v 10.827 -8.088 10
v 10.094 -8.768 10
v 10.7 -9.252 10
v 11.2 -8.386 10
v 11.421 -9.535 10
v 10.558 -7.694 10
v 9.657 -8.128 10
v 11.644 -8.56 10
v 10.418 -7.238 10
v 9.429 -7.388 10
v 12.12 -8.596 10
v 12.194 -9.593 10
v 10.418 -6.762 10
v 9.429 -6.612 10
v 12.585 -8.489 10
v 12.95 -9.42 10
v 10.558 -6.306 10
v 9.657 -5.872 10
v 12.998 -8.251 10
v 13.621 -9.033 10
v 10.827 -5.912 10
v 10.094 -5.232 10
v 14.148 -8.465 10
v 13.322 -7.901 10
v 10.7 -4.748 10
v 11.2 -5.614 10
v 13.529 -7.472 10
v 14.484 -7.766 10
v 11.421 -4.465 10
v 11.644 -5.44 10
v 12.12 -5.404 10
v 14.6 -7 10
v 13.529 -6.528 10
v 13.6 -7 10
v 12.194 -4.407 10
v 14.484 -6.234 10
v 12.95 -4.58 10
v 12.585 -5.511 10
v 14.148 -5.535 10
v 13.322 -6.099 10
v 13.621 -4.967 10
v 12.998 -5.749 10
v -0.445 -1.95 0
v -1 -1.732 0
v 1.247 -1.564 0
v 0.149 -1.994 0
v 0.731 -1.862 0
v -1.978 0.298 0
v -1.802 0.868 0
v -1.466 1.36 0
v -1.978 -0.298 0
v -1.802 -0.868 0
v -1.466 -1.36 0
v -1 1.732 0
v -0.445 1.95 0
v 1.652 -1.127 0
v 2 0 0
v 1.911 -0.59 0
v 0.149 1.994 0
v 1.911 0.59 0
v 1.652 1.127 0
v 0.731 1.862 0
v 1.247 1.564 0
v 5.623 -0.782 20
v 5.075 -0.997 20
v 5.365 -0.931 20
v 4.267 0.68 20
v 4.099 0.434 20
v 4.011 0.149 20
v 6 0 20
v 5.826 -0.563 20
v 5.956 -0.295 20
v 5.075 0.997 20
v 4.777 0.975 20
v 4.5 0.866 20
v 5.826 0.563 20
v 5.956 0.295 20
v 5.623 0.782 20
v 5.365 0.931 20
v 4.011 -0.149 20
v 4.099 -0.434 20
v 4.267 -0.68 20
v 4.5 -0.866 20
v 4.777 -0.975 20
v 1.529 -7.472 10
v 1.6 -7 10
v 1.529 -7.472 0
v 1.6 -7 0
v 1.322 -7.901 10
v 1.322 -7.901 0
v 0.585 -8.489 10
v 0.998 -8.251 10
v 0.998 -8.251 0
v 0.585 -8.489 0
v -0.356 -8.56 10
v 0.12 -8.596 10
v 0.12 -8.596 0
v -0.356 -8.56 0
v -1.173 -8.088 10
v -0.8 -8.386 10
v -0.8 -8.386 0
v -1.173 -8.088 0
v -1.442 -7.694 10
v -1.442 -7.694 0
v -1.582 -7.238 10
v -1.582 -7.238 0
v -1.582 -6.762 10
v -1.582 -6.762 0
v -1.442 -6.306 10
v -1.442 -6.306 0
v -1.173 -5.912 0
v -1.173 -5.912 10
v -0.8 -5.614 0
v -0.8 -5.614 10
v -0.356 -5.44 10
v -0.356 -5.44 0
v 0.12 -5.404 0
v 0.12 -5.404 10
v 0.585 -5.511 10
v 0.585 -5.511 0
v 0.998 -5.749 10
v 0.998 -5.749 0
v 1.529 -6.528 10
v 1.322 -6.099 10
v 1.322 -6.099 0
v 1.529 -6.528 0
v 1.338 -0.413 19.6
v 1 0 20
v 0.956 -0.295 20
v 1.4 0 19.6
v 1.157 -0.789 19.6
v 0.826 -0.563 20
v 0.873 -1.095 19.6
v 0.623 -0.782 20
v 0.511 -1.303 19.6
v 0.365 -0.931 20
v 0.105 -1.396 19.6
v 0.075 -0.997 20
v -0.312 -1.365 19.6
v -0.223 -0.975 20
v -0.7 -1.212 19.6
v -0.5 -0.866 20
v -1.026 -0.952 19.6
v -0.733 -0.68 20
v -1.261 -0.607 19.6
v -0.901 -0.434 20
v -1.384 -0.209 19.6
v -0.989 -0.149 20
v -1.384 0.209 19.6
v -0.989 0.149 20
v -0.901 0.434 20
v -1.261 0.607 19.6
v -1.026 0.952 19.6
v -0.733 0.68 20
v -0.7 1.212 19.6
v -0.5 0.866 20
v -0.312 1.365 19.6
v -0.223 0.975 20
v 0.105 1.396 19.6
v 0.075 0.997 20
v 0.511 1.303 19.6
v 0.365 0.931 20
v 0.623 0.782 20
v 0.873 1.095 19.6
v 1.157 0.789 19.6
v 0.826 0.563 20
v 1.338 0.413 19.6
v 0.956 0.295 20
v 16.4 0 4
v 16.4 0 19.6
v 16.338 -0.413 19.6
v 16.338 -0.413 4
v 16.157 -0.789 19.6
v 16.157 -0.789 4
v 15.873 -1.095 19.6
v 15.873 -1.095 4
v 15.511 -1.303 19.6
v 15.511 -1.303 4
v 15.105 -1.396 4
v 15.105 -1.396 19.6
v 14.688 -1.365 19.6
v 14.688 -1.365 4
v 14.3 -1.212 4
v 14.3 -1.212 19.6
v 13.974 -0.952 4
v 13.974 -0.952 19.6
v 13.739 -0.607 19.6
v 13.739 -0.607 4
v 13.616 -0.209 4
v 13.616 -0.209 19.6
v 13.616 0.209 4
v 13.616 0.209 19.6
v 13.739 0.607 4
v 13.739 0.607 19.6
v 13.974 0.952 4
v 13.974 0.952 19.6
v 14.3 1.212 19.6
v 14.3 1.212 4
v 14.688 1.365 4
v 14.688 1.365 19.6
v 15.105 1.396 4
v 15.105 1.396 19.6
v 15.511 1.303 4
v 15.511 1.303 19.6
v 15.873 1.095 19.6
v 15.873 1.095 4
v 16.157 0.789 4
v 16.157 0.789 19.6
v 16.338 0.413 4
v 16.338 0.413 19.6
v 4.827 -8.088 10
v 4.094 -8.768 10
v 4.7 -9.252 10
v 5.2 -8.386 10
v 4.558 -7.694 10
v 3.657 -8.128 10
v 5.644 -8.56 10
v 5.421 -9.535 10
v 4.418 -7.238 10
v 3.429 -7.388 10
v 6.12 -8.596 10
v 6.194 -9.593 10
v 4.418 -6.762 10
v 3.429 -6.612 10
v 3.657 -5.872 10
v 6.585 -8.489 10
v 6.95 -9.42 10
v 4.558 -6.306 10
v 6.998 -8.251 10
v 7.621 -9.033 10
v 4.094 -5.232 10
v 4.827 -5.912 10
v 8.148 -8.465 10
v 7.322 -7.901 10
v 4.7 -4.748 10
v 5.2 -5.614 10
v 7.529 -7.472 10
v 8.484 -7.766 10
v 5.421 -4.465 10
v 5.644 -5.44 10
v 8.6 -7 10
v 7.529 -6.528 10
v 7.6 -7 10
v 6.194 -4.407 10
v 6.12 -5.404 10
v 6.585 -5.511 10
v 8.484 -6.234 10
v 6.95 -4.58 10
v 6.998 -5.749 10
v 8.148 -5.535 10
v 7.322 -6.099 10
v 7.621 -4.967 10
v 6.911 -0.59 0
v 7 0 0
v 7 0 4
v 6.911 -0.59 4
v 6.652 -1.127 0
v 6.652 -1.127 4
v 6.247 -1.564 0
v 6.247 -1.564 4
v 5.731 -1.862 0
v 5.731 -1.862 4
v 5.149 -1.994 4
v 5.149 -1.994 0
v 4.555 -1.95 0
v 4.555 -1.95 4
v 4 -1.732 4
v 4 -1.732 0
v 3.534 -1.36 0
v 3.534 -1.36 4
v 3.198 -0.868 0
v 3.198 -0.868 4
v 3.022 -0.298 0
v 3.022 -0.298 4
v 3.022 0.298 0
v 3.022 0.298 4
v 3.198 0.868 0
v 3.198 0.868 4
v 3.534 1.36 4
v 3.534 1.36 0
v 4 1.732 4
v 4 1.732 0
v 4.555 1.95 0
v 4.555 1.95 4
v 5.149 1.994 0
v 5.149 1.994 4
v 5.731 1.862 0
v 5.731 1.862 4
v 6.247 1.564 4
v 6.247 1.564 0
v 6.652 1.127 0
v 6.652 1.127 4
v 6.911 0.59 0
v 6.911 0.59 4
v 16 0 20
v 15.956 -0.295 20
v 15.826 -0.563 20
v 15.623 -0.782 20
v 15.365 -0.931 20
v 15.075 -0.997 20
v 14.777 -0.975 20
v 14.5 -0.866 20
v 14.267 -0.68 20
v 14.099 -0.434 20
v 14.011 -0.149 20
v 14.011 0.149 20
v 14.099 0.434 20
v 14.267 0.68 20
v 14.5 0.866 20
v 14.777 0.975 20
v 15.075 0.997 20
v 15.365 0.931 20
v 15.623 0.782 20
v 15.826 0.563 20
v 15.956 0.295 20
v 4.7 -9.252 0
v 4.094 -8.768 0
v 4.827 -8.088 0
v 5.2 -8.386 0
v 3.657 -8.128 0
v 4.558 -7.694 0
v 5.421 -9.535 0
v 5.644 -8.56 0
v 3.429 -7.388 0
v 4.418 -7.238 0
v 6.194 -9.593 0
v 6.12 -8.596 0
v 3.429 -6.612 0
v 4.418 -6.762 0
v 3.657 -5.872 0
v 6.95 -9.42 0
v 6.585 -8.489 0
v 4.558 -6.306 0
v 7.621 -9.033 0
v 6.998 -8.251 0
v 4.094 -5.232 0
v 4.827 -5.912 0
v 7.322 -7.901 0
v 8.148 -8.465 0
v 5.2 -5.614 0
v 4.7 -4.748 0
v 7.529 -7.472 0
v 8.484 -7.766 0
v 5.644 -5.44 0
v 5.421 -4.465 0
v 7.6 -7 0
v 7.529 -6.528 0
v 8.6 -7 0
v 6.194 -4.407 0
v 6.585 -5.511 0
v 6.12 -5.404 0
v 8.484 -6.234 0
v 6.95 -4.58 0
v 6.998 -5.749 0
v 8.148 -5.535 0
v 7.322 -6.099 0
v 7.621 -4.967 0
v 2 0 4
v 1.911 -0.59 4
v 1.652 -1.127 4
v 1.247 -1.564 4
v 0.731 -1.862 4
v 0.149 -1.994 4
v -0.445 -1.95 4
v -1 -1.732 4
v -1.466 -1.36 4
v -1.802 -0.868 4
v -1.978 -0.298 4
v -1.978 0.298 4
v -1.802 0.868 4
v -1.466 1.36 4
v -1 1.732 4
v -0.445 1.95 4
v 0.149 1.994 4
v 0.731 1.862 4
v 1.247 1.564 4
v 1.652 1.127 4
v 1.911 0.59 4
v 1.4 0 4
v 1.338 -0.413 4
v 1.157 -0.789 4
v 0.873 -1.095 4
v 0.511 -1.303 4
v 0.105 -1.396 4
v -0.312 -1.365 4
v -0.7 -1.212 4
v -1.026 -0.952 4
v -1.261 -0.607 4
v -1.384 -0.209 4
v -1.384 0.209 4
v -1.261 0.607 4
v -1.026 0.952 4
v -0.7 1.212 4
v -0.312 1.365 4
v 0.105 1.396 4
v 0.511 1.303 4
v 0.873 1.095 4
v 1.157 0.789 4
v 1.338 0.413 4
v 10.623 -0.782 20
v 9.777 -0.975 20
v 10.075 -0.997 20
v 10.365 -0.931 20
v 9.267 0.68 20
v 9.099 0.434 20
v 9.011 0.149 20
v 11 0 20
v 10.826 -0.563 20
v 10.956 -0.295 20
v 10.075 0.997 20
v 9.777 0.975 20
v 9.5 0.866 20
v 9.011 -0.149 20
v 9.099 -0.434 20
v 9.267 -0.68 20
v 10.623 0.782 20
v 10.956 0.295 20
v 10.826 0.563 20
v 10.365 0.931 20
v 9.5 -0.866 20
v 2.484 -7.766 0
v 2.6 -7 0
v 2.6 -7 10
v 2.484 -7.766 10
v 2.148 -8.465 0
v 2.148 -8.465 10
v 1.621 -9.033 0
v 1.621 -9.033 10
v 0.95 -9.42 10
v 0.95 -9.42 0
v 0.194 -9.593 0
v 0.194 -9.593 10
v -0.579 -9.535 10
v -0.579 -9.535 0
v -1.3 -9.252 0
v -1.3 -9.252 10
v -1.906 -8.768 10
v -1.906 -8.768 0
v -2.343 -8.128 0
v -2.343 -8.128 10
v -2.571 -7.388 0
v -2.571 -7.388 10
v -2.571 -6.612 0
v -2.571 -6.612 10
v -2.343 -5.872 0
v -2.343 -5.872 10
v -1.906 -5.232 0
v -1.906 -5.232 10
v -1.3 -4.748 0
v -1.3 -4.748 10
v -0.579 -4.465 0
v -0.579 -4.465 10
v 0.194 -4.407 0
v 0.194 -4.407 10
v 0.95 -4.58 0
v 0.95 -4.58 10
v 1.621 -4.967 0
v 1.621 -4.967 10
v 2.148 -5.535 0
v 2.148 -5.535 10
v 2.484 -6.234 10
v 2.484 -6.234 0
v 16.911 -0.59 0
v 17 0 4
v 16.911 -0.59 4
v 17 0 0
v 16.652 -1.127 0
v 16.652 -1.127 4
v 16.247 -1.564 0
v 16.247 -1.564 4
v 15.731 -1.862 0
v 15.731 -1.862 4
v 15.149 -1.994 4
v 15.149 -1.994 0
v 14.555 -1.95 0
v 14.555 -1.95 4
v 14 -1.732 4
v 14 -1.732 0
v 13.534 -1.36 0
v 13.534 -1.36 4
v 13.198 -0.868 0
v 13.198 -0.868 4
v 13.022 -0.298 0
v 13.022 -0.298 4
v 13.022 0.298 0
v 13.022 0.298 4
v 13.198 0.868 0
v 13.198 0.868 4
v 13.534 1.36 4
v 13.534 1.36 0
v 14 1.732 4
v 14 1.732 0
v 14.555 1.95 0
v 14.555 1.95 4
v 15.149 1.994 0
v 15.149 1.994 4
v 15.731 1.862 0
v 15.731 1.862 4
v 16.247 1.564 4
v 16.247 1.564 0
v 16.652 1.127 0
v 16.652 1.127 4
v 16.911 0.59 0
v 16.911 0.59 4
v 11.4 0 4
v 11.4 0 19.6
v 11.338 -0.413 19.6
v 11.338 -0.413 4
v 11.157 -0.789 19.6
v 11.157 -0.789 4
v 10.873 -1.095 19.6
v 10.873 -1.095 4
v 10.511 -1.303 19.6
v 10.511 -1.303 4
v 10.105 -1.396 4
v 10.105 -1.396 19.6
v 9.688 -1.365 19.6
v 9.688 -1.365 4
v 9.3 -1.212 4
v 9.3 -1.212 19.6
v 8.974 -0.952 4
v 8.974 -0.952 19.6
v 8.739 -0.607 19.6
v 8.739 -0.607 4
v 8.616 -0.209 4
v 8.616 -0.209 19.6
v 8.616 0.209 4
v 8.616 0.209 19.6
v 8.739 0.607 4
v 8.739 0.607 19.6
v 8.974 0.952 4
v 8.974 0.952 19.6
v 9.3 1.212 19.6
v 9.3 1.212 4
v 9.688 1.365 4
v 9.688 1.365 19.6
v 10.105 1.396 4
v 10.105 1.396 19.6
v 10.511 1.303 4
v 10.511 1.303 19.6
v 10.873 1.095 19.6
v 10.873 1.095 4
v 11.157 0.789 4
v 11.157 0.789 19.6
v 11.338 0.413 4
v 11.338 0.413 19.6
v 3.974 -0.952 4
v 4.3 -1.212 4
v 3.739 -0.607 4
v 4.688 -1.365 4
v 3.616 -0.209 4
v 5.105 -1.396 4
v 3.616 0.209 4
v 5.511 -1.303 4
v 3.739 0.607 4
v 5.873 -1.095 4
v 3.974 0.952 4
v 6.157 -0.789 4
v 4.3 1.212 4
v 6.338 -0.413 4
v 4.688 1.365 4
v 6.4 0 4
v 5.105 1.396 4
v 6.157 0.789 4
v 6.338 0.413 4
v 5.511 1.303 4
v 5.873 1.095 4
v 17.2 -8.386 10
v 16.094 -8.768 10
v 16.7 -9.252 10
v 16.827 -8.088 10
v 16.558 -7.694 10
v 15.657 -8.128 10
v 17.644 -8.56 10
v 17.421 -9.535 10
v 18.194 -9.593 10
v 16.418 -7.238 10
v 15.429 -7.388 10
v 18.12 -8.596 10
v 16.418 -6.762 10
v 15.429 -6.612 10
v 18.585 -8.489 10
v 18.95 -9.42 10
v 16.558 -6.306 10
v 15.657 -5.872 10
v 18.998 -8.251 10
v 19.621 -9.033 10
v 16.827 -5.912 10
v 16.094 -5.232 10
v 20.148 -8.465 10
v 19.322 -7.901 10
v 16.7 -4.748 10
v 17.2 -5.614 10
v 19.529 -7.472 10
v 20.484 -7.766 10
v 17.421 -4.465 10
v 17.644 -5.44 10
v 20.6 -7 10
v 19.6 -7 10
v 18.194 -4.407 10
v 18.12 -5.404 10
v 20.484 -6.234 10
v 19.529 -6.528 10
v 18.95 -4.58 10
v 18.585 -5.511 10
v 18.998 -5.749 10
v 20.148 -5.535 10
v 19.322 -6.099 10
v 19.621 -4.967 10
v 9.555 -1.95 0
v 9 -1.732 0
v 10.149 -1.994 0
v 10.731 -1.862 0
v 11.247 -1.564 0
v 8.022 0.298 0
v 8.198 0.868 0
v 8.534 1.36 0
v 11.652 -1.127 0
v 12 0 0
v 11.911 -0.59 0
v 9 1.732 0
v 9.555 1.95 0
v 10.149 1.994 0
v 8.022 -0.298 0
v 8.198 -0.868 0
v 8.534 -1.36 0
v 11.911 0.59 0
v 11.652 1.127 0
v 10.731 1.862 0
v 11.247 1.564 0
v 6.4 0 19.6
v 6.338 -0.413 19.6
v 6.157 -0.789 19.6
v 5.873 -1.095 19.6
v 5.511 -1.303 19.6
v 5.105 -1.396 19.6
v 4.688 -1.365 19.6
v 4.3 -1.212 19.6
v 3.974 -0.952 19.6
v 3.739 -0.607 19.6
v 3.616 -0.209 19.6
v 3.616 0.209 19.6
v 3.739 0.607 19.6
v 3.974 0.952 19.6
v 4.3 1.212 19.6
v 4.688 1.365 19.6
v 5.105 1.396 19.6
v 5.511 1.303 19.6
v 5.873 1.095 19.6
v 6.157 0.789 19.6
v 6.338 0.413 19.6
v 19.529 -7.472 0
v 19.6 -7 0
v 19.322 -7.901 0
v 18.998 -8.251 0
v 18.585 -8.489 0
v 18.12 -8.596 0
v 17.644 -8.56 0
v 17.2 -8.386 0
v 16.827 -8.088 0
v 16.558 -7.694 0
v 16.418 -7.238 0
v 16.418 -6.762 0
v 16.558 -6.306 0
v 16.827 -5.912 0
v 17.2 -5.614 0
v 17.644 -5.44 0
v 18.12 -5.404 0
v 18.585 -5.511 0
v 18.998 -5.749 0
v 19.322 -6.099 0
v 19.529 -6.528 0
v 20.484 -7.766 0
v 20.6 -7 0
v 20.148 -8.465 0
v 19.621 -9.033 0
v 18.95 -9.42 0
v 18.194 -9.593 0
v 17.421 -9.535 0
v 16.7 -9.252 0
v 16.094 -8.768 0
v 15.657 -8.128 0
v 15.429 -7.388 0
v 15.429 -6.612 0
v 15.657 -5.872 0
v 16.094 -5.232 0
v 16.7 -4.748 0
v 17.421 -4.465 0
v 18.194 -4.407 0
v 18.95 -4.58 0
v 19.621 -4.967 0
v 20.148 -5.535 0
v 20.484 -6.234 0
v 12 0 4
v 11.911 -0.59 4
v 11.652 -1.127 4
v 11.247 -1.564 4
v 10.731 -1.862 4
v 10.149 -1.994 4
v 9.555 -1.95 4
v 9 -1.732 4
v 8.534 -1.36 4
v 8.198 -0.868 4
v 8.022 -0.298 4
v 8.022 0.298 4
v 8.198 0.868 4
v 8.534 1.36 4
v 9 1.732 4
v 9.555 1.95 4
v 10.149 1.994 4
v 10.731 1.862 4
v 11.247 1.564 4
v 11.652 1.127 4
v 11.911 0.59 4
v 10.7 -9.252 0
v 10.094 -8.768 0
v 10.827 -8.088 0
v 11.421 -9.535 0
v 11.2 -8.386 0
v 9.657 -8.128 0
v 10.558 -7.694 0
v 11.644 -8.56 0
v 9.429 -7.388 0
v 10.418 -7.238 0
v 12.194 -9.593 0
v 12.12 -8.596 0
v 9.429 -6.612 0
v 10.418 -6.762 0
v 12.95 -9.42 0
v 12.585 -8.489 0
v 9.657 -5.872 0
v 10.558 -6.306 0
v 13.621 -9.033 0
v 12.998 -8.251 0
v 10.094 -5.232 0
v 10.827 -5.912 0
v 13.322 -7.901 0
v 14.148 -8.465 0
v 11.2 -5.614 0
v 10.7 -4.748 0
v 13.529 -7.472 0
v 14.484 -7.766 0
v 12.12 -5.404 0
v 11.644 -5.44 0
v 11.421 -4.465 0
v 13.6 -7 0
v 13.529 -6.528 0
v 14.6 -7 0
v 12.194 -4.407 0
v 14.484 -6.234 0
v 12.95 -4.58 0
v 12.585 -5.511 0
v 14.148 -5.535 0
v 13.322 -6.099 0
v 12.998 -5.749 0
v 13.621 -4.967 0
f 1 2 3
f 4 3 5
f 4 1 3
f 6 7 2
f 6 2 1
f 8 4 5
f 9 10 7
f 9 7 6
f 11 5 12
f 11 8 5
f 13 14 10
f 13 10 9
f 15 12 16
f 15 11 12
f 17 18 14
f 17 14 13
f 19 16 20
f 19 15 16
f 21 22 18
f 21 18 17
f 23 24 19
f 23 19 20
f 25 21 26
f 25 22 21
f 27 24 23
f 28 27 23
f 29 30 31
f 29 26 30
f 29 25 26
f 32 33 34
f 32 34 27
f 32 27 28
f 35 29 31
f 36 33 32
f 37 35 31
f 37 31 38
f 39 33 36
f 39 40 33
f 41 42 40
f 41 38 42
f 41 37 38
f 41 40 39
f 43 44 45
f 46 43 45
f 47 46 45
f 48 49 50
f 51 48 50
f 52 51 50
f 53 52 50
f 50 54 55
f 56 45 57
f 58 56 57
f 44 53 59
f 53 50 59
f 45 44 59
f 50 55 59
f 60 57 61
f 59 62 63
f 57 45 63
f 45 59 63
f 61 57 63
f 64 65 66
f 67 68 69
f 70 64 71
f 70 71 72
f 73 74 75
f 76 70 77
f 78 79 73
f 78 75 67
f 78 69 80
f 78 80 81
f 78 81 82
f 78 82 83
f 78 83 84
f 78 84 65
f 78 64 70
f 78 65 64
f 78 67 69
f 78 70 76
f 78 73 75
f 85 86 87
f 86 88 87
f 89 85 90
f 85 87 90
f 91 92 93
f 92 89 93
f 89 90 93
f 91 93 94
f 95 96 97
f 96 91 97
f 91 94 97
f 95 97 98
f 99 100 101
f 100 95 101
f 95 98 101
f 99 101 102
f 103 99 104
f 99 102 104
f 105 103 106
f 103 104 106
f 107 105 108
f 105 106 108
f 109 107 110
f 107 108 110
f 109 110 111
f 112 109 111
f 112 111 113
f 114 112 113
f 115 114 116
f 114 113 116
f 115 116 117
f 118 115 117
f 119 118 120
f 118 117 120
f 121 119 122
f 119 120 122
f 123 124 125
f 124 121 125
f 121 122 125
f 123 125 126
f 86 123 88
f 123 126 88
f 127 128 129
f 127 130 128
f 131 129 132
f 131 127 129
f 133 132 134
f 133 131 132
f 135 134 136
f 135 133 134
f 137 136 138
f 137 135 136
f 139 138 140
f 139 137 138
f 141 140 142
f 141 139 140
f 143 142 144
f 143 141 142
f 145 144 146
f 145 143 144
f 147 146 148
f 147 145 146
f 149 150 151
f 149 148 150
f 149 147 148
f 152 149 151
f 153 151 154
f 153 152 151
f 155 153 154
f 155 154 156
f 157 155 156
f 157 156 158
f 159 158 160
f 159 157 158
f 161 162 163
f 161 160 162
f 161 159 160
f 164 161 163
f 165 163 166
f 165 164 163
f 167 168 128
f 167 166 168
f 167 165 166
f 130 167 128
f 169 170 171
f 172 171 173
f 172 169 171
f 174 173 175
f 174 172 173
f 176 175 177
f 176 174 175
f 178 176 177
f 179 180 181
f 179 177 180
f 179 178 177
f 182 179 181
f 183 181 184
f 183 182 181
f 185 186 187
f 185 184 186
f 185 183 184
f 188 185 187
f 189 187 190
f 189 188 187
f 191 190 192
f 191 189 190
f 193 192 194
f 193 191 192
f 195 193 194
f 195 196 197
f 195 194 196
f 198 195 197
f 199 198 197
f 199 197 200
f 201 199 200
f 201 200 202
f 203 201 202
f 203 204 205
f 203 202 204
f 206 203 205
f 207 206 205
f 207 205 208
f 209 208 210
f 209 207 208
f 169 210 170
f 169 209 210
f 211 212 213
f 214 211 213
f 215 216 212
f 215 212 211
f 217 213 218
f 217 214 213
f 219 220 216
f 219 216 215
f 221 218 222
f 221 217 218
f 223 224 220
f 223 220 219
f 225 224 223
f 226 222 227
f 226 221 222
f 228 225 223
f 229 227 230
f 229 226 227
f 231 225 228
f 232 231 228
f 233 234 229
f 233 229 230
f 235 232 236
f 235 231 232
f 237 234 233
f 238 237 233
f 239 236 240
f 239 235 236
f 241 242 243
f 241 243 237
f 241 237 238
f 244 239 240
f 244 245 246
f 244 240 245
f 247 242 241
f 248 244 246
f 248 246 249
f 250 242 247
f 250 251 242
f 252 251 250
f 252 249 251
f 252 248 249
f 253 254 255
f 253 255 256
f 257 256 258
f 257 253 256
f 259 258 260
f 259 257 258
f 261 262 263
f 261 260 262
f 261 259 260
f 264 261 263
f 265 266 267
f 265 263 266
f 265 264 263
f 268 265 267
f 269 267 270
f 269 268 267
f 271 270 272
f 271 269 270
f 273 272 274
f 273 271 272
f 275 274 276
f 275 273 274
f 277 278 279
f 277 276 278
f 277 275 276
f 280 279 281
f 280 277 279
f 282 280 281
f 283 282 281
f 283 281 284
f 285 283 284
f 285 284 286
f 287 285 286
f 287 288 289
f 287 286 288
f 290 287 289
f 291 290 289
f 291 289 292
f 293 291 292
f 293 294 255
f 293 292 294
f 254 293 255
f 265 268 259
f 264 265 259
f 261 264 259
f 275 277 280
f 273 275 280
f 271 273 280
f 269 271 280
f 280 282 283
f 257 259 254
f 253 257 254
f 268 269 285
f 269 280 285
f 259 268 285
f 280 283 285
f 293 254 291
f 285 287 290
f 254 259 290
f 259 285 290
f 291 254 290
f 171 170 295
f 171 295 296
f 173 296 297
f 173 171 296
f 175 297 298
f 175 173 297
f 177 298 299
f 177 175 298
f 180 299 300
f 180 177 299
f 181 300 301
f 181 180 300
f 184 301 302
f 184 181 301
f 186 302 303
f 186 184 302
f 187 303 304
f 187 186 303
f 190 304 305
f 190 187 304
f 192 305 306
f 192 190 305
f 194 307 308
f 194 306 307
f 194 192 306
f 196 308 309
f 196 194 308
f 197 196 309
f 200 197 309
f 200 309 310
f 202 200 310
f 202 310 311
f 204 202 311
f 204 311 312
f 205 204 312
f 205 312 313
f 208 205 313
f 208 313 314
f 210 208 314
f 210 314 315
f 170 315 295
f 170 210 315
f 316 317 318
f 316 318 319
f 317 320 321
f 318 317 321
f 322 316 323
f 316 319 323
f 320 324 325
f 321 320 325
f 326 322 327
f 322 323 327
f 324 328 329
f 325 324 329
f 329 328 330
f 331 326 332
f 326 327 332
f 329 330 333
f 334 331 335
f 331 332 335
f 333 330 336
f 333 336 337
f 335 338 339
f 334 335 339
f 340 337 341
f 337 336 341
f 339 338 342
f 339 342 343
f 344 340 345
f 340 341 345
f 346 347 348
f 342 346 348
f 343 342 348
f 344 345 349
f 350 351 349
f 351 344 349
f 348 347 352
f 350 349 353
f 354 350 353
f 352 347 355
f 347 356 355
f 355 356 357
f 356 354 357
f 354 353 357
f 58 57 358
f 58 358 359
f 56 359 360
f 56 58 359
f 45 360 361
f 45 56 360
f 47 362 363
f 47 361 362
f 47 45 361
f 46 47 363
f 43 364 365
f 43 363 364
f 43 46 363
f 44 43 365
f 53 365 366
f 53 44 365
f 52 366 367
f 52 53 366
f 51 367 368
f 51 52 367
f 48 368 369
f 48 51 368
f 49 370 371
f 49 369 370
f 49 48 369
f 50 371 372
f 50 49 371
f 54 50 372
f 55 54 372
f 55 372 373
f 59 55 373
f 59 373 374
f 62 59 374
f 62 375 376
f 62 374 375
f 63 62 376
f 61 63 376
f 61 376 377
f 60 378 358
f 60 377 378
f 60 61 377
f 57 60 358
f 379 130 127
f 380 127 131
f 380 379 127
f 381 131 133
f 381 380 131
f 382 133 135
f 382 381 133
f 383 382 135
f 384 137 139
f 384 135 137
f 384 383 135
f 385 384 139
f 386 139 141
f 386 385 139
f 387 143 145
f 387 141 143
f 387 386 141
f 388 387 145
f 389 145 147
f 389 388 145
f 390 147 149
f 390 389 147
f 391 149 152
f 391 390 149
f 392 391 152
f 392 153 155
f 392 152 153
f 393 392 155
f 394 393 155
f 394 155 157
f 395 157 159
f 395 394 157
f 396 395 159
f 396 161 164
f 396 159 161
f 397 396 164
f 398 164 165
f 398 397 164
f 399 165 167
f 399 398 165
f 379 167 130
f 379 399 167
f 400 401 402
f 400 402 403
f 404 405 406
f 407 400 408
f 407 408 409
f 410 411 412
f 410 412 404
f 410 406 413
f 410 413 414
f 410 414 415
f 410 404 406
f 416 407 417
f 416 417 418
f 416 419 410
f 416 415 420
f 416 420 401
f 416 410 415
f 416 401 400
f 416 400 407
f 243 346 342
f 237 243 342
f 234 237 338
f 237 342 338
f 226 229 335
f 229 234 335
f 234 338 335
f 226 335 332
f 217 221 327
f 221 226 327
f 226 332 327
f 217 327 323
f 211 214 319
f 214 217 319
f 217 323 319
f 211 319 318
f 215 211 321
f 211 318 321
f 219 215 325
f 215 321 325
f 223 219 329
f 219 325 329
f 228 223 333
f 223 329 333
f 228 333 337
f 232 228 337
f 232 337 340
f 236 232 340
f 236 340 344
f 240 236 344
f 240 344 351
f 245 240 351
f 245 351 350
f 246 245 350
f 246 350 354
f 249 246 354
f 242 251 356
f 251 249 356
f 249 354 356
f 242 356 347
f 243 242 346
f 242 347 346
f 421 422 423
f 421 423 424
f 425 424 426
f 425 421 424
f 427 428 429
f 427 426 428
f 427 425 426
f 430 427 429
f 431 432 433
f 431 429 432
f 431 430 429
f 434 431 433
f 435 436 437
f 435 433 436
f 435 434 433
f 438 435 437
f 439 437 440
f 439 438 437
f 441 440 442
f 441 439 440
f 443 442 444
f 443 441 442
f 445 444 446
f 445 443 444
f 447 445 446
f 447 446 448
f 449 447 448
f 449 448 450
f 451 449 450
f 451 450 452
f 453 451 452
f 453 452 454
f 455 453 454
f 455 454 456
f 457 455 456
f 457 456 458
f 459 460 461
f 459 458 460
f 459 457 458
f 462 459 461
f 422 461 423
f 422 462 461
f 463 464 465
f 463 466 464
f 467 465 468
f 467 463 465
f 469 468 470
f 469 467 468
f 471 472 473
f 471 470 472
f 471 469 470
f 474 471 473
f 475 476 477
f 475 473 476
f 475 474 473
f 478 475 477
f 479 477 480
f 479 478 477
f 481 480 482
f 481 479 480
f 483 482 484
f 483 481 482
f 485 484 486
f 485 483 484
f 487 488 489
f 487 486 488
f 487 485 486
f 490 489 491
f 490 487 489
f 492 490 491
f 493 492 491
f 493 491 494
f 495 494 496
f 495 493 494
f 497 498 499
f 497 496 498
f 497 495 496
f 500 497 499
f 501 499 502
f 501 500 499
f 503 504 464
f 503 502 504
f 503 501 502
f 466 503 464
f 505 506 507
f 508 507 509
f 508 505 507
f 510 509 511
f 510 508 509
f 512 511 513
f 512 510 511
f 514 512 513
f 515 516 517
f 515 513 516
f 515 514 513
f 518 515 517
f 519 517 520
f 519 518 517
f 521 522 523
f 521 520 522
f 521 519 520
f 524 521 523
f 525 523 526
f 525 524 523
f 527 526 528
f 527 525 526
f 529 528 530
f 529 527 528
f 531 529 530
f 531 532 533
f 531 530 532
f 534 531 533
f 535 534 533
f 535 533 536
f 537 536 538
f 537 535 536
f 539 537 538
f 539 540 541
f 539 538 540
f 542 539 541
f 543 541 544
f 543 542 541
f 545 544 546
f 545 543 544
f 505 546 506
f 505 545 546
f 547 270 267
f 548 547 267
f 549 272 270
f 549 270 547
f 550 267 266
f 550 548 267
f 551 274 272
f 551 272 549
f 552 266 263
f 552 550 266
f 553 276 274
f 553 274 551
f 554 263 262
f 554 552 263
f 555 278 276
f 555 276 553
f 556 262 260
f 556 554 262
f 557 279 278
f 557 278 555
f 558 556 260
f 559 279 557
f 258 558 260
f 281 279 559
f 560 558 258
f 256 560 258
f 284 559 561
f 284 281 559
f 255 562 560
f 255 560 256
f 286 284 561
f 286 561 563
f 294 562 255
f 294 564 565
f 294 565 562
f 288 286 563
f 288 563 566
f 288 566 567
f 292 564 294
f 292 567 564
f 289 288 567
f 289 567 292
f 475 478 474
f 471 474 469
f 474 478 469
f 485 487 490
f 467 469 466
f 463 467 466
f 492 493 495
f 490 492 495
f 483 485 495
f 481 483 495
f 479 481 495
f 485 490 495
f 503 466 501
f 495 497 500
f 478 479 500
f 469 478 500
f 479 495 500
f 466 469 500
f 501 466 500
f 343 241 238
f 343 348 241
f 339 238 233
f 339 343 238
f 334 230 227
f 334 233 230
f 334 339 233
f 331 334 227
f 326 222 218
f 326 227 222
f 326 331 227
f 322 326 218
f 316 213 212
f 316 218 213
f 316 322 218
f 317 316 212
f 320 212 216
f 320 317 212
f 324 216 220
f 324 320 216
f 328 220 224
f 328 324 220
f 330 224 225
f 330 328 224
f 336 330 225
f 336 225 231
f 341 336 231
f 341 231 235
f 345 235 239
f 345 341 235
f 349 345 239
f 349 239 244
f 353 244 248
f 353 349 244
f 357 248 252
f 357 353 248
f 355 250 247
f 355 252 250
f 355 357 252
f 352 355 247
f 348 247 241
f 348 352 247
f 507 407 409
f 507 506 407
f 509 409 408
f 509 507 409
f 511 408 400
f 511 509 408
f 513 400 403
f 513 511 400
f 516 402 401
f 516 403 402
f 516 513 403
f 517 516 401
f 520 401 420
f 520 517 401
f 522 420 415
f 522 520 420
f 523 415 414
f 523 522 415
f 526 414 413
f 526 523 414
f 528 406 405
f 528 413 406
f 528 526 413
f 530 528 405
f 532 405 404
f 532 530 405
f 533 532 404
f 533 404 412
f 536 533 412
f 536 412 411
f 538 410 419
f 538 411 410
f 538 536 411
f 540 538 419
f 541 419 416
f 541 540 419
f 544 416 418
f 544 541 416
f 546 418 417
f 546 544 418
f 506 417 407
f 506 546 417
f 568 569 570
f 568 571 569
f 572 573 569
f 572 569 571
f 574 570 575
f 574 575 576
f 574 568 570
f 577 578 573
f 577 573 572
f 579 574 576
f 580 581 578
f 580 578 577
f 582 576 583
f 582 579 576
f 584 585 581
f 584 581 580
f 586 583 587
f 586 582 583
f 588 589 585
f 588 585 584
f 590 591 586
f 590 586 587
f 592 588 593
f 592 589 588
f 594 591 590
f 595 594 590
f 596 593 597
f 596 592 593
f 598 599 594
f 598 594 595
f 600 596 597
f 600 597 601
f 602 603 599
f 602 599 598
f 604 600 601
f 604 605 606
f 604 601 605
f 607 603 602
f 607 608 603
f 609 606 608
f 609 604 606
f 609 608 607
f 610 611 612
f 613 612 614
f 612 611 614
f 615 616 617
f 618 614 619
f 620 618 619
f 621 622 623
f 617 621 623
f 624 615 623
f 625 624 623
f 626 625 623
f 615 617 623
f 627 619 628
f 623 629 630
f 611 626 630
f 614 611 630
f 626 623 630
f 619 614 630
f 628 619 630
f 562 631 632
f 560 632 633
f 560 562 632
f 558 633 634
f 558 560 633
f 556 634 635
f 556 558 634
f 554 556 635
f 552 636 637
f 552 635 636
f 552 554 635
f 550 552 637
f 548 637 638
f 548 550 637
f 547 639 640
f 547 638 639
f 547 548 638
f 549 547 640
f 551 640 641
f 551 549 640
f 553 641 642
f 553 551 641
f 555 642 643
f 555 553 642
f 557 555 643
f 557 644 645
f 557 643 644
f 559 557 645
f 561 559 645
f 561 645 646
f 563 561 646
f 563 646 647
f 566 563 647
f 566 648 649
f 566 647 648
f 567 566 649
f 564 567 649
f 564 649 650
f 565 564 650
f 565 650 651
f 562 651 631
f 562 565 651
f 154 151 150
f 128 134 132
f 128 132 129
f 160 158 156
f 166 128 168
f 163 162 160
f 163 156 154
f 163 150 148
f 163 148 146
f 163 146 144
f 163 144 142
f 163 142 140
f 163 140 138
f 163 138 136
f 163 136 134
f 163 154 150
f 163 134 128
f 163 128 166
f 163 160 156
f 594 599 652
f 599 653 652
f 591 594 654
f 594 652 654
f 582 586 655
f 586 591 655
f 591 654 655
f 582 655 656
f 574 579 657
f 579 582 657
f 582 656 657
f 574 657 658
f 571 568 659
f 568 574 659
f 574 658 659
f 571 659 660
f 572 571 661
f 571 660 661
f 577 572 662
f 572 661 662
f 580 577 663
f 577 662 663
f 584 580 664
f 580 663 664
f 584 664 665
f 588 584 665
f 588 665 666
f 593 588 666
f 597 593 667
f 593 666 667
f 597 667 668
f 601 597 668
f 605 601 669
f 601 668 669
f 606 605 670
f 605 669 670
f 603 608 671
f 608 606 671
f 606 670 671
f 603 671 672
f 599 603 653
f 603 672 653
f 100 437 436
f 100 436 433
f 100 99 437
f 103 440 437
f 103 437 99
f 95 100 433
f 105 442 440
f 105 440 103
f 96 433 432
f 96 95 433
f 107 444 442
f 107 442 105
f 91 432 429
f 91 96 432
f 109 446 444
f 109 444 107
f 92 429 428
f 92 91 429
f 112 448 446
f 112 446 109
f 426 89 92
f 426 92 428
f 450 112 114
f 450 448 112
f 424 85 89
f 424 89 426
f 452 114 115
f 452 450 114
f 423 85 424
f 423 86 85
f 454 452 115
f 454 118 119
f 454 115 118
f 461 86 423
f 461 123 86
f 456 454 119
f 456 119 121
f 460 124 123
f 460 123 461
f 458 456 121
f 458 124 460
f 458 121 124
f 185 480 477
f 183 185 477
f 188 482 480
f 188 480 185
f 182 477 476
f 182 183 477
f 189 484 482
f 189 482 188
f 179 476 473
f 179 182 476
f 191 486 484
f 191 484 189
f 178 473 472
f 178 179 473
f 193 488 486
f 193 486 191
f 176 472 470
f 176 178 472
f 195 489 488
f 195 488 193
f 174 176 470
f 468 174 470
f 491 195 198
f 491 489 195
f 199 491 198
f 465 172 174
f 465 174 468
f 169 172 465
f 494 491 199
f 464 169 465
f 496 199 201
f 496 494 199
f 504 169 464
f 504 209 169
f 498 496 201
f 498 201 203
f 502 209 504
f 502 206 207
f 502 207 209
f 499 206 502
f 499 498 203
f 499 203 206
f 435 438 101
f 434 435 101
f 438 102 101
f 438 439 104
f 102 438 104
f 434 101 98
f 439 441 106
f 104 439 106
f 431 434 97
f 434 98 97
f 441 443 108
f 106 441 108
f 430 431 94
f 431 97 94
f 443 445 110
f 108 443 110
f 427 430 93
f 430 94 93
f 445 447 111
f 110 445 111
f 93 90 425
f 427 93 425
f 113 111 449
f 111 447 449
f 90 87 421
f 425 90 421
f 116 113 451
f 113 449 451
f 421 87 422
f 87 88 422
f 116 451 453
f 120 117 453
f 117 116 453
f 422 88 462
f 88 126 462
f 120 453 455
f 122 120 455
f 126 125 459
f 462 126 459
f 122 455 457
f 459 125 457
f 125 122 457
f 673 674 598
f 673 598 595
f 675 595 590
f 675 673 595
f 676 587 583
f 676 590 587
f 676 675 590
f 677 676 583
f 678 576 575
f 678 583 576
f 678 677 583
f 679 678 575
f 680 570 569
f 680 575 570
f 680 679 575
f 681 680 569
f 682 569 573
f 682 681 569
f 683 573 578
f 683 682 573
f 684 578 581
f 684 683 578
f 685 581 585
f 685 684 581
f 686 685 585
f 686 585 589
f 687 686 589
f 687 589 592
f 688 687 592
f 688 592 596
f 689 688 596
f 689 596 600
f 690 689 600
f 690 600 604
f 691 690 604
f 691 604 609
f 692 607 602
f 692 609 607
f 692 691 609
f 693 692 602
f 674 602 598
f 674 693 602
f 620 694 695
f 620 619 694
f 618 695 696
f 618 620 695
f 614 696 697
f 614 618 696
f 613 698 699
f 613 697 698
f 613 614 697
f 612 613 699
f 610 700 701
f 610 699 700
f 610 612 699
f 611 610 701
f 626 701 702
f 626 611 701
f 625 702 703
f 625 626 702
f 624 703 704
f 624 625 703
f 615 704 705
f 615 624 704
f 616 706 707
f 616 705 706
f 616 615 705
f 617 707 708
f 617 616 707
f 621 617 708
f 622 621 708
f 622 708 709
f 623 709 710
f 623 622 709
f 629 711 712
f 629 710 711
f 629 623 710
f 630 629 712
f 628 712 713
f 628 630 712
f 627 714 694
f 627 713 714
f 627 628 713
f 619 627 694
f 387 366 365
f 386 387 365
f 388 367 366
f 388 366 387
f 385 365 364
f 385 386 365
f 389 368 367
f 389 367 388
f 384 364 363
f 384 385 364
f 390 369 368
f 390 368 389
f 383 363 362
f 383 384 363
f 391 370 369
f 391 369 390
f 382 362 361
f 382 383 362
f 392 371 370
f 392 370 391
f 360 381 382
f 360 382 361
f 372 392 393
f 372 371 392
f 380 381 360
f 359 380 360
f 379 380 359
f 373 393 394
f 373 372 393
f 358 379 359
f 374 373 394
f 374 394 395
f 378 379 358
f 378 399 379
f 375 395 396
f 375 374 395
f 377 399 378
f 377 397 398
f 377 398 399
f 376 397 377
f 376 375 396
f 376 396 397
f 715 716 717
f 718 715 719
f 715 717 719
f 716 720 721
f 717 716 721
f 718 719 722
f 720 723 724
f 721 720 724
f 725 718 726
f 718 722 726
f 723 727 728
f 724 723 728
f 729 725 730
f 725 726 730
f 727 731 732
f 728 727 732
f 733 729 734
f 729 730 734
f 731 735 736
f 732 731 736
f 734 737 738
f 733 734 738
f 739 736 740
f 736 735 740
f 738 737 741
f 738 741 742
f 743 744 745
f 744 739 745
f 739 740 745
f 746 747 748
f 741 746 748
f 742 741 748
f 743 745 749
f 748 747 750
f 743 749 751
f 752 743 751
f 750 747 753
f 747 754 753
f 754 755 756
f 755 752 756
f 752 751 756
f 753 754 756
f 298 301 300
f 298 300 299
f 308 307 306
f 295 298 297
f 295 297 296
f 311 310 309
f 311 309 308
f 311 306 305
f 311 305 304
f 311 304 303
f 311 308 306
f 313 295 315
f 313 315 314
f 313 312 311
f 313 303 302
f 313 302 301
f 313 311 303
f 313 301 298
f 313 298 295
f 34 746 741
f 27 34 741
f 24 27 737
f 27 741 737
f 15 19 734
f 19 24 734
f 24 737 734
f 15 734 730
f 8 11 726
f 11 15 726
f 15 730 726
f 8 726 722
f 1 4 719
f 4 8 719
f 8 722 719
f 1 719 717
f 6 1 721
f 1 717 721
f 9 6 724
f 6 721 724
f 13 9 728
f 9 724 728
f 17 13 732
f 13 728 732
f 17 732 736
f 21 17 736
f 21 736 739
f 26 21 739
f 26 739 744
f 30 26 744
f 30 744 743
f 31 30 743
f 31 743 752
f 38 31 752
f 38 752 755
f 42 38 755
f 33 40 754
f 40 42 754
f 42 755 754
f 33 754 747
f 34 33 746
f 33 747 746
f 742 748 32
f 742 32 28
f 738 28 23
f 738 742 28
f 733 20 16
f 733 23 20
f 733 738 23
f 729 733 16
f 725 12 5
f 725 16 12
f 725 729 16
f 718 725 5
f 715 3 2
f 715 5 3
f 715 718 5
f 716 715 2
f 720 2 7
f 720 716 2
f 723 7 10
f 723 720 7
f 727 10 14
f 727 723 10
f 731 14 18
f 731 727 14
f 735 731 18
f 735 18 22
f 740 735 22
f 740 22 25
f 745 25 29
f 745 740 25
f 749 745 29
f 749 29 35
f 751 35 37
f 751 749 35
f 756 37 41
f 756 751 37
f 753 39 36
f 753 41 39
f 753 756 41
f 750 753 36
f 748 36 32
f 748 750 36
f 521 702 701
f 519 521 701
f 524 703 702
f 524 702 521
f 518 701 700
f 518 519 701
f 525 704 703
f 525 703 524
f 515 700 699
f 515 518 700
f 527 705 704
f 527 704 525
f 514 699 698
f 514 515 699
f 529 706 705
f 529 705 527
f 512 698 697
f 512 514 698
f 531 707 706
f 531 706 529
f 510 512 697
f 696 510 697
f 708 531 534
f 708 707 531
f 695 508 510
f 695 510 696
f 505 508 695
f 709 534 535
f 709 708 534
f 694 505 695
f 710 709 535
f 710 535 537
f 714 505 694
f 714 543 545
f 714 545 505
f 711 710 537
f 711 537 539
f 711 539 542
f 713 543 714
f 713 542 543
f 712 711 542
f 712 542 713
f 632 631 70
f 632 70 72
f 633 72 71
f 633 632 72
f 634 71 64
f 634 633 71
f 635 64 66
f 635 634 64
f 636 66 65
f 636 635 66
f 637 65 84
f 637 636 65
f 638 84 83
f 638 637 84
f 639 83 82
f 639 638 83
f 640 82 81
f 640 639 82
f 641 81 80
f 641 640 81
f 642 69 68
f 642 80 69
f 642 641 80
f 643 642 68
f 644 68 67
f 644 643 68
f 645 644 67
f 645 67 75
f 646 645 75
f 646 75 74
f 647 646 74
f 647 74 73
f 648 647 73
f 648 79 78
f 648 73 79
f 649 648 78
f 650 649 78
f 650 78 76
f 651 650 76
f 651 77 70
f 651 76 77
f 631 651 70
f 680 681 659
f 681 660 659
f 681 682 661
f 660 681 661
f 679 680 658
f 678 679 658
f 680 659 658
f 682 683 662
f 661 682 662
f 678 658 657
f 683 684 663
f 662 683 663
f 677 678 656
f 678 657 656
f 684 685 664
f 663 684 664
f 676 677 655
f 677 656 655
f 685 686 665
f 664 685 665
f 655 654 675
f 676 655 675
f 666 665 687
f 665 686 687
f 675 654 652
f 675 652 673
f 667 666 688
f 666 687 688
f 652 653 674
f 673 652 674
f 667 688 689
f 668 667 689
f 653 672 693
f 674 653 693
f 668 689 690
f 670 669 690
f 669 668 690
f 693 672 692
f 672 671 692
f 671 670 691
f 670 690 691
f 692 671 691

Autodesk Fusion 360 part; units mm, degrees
sketch "Sketch1" plane through (0, 0, 0) normal (0, 0, 1) x (1, 0, 0)
  circle A0 centre (0, 0) radius 1.4
  dimension "d2" = 2.8
extrude "Extrude1" add sketch "Sketch1" along normal blind 20 makes body 1
sketch "Sketch2" plane through (0, 0, 0) normal (0, 0, 1) x (1, 0, 0)
  circle A0 centre (0, 0) radius 2
  dimension "d6" = 4
extrude "Extrude2" add sketch "Sketch2" along normal blind 4 bodies 1
copy_body "Body->Comp1" bodies 1 removing the originals makes body 2 in component "Component"
sketch "Sketch3" plane through (0, 0, 0) normal (0, 0, 1) x (1, 0, 0)
  circle A0 centre (0, -7) radius 1.6
  circle A1 centre (0, -7) radius 2.6
  dimension "d9" = 3.2
  dimension "d10" = 5.2
extrude "Extrude3" add sketch "Sketch3" along normal blind 10 separate body makes body 3
copy_body "Body->Comp2" bodies 3 removing the originals makes body 4 in component "Component'"
chamfer "Chamfer1" distance 0.4 angle 45 1 edges at (-1.3053, -0.5063, 20) on bodies 2 in component "Component"
sketch "Sketch4" plane through (0, 0, 0) normal (0, 0, 1) x (1, 0, 0)
component "Component" placed x (1, 0, 0) y (0, 1, 0) z (0, 0, 1) at (0, 0, 0)
component "Component" placed x (1, 0, 0) y (0, 1, 0) z (0, 0, 1) at (5, 0, 0)
component "Component" placed x (1, 0, 0) y (0, 1, 0) z (0, 0, 1) at (10, 0, 0)
component "Component" placed x (1, 0, 0) y (0, 1, 0) z (0, 0, 1) at (15, 0, 0)
component "Component'" placed x (1, 0, 0) y (0, 1, 0) z (0, 0, 1) at (0, 0, 0)
component "Component'" placed x (1, 0, 0) y (0, 1, 0) z (0, 0, 1) at (6, 0, 0)
component "Component'" placed x (1, 0, 0) y (0, 1, 0) z (0, 0, 1) at (12, 0, 0)
component "Component'" placed x (1, 0, 0) y (0, 1, 0) z (0, 0, 1) at (18, 0, 0)
equation "hole_diameter = 3.2 mm"
equation "circle_height = 20 mm"
equation "d4 = circle_height"
